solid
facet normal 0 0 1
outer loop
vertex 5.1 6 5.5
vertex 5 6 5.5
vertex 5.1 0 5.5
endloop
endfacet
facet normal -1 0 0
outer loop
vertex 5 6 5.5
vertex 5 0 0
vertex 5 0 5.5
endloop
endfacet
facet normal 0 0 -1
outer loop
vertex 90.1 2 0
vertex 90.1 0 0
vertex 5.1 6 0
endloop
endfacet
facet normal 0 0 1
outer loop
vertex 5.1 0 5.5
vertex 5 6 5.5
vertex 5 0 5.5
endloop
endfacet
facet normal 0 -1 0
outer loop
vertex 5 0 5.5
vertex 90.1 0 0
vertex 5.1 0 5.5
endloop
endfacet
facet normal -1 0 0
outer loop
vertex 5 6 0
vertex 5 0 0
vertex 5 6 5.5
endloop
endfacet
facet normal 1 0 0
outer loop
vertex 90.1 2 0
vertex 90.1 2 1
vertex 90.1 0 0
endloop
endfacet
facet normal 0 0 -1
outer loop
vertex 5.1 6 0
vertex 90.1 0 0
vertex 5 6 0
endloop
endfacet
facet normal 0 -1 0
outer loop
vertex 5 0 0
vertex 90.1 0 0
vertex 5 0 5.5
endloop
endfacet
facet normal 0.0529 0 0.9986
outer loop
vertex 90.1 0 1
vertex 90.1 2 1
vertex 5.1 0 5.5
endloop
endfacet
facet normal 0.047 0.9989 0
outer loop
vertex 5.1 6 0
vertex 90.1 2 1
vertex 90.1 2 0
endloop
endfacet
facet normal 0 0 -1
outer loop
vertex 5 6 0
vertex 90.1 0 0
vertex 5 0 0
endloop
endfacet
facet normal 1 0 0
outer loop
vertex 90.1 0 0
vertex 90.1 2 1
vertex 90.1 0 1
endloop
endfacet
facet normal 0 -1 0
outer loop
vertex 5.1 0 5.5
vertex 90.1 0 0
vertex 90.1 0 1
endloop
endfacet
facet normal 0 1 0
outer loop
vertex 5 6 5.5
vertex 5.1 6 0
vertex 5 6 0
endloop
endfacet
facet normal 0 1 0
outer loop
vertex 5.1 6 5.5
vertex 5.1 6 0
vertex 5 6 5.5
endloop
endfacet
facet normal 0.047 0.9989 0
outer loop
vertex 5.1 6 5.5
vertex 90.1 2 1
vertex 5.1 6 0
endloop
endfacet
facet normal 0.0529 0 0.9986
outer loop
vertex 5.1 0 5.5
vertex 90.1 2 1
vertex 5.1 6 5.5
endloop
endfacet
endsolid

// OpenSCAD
module fixation(){
   linear_extrude (height=1.01, $fn = 200)
    import (file="profil.dxf", layer="accroche-exterieur", $fn=500);
    translate([0,0,1])
     linear_extrude (height=4, $fn = 200)
    import (file="profil.dxf", layer="accroche", $fn=500);
    translate([0,0,4.999])
    linear_extrude (height=1.01, $fn = 200)
    import (file="profil.dxf", layer="accroche-exterieur", $fn=500);
   
}    

        translate ([0,0,3.5])
        rotate([270,270,0])fixation(); 


        translate ([2.9999,0,0])
        linear_extrude (height=1, $fn = 200)
        import (file="profil.dxf", layer="0", $fn=500);


        hull(){
             translate ([4.9999,0,0])
             cube ([0.1,6,5.5]);
            
              translate ([90,0,0])
             cube ([0.1,2,1]);       
        }
